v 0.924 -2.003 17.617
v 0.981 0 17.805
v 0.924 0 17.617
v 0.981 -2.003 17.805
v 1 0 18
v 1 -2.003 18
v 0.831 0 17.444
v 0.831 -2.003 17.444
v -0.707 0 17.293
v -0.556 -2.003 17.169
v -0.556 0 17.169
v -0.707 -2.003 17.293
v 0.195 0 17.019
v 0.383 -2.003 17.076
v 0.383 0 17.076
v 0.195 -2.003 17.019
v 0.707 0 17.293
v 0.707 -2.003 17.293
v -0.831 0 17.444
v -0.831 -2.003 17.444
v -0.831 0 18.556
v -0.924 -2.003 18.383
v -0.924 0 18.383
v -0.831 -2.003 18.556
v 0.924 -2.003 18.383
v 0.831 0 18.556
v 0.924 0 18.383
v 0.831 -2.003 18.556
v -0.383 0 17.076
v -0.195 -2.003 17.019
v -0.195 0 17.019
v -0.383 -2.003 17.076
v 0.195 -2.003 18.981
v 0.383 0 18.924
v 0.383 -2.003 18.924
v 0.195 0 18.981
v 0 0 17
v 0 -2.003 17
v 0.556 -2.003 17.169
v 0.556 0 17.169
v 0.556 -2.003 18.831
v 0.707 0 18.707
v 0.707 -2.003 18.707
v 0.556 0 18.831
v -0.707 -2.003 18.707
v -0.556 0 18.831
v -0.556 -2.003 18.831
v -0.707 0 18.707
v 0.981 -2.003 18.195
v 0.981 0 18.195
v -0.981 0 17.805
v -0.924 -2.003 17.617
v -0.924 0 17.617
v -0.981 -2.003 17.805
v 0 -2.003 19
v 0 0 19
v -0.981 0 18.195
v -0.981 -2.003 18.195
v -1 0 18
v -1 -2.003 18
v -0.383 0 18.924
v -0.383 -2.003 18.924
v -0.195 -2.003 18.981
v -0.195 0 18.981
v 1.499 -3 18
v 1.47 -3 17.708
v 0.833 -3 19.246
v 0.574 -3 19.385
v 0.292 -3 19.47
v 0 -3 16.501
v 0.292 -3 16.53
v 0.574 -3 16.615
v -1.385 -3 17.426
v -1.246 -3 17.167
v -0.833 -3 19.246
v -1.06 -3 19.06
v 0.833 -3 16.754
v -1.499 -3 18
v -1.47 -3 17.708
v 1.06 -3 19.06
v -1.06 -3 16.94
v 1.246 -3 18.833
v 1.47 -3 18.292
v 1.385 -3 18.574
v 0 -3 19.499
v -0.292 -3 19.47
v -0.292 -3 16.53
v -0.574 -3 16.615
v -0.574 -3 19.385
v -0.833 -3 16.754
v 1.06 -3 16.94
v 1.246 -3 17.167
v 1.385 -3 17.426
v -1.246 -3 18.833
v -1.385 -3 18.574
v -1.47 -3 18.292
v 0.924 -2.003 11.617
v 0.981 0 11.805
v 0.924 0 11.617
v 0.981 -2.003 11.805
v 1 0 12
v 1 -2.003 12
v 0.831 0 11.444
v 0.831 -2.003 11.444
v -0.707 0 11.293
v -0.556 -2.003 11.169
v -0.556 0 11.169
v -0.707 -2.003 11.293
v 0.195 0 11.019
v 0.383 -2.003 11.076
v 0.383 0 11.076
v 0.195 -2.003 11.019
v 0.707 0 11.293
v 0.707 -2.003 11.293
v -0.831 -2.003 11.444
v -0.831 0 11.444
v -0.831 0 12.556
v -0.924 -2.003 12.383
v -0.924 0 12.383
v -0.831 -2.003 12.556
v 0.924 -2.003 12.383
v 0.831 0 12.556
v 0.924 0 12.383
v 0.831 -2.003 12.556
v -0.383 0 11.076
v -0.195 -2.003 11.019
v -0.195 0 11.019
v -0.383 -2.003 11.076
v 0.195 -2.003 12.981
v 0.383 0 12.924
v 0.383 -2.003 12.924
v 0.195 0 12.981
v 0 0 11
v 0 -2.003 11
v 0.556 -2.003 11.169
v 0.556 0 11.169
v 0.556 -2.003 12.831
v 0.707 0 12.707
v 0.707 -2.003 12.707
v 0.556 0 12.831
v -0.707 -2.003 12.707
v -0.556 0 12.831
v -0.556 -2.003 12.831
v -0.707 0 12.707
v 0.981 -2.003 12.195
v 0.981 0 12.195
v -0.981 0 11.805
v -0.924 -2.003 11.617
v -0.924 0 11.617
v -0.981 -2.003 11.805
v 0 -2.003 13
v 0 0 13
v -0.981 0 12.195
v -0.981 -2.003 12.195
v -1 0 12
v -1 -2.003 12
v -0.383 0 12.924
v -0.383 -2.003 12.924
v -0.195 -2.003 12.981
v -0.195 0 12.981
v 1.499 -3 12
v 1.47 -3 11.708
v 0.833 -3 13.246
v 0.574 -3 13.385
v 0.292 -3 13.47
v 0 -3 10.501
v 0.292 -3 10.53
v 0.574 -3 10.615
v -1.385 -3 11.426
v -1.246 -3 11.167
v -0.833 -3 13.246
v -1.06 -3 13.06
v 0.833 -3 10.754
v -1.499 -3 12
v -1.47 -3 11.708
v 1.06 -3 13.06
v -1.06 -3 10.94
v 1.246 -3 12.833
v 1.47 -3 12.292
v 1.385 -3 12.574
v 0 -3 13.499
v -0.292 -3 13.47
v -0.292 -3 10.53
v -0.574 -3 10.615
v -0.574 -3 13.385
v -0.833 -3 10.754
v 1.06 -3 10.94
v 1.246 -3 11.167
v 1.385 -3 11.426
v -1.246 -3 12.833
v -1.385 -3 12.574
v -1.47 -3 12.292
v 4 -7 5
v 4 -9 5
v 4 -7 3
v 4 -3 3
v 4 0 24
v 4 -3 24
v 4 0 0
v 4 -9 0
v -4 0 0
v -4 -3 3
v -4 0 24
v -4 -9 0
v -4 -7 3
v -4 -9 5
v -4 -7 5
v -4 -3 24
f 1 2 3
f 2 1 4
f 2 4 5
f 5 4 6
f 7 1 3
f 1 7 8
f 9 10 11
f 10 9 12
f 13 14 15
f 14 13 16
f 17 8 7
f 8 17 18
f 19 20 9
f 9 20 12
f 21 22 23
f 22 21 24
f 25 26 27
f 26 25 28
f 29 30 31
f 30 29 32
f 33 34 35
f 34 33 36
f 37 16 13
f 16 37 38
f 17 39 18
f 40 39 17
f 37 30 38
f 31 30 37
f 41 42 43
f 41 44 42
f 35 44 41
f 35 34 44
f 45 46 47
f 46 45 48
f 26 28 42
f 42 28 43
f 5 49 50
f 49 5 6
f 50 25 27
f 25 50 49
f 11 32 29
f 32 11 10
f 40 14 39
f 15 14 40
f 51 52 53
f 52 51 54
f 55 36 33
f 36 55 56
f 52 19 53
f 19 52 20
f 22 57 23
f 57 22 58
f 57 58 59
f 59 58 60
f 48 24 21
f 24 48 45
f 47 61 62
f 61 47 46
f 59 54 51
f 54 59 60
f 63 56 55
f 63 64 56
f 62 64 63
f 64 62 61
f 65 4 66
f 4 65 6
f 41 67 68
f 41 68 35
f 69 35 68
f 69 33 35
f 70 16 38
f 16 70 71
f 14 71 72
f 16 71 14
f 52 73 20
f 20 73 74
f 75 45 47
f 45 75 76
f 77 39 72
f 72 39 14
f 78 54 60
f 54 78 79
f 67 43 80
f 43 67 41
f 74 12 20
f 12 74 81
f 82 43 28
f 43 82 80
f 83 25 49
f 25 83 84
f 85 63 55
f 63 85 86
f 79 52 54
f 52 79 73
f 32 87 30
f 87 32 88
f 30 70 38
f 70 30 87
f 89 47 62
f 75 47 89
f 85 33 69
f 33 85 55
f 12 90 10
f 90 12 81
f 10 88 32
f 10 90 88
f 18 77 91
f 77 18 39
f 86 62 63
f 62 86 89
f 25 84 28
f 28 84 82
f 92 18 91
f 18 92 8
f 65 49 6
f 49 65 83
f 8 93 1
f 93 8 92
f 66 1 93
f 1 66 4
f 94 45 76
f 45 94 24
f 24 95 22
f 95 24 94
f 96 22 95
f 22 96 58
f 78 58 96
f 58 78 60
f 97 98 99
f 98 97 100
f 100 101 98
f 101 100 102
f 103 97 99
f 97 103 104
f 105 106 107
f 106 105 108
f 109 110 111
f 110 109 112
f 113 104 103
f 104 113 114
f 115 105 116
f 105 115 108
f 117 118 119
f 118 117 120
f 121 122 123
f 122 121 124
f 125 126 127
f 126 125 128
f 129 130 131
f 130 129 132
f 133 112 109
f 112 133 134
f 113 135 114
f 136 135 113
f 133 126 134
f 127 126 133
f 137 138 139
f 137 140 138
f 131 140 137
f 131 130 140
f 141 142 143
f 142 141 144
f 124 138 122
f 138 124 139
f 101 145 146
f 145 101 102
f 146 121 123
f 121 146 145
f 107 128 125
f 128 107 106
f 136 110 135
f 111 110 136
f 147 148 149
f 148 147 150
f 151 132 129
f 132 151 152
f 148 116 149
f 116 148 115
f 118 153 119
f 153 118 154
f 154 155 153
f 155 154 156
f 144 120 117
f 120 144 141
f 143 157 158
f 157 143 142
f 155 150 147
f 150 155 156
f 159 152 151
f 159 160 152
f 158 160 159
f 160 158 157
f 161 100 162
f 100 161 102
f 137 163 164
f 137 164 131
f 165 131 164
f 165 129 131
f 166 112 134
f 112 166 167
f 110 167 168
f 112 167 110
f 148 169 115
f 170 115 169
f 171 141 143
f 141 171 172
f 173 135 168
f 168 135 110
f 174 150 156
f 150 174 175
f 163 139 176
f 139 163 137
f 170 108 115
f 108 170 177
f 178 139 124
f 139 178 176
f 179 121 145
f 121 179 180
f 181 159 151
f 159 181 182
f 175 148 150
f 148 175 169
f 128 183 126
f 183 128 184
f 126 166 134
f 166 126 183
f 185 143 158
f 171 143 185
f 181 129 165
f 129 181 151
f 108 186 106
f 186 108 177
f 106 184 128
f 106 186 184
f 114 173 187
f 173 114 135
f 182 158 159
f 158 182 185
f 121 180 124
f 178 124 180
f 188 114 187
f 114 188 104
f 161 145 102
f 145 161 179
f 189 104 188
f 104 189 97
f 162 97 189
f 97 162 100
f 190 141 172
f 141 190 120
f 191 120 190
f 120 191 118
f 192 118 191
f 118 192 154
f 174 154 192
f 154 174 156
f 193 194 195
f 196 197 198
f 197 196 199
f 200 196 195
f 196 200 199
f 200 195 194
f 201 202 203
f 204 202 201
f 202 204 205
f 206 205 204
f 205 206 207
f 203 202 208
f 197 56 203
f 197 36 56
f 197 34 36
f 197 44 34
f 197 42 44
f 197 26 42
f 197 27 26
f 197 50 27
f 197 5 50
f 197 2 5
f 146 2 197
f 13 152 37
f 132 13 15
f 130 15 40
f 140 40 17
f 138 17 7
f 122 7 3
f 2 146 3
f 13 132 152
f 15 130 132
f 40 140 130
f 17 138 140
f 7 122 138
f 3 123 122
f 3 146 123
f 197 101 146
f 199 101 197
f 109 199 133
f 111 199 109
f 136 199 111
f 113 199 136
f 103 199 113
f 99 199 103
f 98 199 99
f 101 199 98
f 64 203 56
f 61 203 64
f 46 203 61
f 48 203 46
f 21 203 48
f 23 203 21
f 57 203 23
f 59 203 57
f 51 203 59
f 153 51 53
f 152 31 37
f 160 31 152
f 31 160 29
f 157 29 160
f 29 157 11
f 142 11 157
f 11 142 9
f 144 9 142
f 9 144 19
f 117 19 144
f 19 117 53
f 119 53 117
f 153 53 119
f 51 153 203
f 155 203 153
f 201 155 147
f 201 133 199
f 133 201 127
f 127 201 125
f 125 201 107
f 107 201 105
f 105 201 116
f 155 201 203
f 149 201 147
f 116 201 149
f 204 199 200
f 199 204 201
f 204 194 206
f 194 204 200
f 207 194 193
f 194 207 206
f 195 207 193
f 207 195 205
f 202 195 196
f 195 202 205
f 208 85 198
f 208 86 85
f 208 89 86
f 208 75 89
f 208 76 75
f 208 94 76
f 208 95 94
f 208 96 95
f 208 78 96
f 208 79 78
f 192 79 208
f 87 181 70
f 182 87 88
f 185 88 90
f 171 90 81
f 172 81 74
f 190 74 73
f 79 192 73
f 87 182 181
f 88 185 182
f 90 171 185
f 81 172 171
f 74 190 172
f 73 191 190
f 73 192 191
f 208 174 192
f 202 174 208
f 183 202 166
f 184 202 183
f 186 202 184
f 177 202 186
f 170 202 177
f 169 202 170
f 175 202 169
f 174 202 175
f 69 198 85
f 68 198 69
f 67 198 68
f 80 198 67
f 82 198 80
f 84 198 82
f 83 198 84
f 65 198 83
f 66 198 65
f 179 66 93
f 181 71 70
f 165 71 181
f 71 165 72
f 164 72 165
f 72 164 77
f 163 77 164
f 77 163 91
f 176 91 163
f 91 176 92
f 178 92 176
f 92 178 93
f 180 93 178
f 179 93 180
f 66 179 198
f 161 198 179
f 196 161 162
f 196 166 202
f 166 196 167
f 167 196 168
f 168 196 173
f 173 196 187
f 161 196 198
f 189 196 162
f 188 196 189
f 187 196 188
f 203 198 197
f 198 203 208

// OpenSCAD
width = 8;
holeSize = 2;
thickness = 3;

module RawHook(width, height, thickness) {
    translate([0,0,-width/2]) linear_extrude(width, convexity=2) {
        difference() {
            union() {
                square([thickness, height]);
                square([thickness+4+2, 5]);
            }
            translate([thickness,3]) square([4,10]);
        }
    }
}

module Hole(holeSize) {
    translate([1,0,0]) rotate([0,90,180]) {
        $fn=32;
        cylinder(h=8, d=holeSize);
        cylinder(h=tan(89.9/2)*holeSize*2, d1=holeSize*2, d2=0);
    }
}

module Hook(width=8, holeSize=2, thickness=3) {
    height = width * 3;
    difference() {
        RawHook(width, height, thickness);
        translate([thickness,height*3/4,0]) Hole(holeSize);
        translate([thickness,height*1/2,0]) Hole(holeSize);
    }
}


rotate([90,0,-90]) Hook(width, holeSize, thickness);
